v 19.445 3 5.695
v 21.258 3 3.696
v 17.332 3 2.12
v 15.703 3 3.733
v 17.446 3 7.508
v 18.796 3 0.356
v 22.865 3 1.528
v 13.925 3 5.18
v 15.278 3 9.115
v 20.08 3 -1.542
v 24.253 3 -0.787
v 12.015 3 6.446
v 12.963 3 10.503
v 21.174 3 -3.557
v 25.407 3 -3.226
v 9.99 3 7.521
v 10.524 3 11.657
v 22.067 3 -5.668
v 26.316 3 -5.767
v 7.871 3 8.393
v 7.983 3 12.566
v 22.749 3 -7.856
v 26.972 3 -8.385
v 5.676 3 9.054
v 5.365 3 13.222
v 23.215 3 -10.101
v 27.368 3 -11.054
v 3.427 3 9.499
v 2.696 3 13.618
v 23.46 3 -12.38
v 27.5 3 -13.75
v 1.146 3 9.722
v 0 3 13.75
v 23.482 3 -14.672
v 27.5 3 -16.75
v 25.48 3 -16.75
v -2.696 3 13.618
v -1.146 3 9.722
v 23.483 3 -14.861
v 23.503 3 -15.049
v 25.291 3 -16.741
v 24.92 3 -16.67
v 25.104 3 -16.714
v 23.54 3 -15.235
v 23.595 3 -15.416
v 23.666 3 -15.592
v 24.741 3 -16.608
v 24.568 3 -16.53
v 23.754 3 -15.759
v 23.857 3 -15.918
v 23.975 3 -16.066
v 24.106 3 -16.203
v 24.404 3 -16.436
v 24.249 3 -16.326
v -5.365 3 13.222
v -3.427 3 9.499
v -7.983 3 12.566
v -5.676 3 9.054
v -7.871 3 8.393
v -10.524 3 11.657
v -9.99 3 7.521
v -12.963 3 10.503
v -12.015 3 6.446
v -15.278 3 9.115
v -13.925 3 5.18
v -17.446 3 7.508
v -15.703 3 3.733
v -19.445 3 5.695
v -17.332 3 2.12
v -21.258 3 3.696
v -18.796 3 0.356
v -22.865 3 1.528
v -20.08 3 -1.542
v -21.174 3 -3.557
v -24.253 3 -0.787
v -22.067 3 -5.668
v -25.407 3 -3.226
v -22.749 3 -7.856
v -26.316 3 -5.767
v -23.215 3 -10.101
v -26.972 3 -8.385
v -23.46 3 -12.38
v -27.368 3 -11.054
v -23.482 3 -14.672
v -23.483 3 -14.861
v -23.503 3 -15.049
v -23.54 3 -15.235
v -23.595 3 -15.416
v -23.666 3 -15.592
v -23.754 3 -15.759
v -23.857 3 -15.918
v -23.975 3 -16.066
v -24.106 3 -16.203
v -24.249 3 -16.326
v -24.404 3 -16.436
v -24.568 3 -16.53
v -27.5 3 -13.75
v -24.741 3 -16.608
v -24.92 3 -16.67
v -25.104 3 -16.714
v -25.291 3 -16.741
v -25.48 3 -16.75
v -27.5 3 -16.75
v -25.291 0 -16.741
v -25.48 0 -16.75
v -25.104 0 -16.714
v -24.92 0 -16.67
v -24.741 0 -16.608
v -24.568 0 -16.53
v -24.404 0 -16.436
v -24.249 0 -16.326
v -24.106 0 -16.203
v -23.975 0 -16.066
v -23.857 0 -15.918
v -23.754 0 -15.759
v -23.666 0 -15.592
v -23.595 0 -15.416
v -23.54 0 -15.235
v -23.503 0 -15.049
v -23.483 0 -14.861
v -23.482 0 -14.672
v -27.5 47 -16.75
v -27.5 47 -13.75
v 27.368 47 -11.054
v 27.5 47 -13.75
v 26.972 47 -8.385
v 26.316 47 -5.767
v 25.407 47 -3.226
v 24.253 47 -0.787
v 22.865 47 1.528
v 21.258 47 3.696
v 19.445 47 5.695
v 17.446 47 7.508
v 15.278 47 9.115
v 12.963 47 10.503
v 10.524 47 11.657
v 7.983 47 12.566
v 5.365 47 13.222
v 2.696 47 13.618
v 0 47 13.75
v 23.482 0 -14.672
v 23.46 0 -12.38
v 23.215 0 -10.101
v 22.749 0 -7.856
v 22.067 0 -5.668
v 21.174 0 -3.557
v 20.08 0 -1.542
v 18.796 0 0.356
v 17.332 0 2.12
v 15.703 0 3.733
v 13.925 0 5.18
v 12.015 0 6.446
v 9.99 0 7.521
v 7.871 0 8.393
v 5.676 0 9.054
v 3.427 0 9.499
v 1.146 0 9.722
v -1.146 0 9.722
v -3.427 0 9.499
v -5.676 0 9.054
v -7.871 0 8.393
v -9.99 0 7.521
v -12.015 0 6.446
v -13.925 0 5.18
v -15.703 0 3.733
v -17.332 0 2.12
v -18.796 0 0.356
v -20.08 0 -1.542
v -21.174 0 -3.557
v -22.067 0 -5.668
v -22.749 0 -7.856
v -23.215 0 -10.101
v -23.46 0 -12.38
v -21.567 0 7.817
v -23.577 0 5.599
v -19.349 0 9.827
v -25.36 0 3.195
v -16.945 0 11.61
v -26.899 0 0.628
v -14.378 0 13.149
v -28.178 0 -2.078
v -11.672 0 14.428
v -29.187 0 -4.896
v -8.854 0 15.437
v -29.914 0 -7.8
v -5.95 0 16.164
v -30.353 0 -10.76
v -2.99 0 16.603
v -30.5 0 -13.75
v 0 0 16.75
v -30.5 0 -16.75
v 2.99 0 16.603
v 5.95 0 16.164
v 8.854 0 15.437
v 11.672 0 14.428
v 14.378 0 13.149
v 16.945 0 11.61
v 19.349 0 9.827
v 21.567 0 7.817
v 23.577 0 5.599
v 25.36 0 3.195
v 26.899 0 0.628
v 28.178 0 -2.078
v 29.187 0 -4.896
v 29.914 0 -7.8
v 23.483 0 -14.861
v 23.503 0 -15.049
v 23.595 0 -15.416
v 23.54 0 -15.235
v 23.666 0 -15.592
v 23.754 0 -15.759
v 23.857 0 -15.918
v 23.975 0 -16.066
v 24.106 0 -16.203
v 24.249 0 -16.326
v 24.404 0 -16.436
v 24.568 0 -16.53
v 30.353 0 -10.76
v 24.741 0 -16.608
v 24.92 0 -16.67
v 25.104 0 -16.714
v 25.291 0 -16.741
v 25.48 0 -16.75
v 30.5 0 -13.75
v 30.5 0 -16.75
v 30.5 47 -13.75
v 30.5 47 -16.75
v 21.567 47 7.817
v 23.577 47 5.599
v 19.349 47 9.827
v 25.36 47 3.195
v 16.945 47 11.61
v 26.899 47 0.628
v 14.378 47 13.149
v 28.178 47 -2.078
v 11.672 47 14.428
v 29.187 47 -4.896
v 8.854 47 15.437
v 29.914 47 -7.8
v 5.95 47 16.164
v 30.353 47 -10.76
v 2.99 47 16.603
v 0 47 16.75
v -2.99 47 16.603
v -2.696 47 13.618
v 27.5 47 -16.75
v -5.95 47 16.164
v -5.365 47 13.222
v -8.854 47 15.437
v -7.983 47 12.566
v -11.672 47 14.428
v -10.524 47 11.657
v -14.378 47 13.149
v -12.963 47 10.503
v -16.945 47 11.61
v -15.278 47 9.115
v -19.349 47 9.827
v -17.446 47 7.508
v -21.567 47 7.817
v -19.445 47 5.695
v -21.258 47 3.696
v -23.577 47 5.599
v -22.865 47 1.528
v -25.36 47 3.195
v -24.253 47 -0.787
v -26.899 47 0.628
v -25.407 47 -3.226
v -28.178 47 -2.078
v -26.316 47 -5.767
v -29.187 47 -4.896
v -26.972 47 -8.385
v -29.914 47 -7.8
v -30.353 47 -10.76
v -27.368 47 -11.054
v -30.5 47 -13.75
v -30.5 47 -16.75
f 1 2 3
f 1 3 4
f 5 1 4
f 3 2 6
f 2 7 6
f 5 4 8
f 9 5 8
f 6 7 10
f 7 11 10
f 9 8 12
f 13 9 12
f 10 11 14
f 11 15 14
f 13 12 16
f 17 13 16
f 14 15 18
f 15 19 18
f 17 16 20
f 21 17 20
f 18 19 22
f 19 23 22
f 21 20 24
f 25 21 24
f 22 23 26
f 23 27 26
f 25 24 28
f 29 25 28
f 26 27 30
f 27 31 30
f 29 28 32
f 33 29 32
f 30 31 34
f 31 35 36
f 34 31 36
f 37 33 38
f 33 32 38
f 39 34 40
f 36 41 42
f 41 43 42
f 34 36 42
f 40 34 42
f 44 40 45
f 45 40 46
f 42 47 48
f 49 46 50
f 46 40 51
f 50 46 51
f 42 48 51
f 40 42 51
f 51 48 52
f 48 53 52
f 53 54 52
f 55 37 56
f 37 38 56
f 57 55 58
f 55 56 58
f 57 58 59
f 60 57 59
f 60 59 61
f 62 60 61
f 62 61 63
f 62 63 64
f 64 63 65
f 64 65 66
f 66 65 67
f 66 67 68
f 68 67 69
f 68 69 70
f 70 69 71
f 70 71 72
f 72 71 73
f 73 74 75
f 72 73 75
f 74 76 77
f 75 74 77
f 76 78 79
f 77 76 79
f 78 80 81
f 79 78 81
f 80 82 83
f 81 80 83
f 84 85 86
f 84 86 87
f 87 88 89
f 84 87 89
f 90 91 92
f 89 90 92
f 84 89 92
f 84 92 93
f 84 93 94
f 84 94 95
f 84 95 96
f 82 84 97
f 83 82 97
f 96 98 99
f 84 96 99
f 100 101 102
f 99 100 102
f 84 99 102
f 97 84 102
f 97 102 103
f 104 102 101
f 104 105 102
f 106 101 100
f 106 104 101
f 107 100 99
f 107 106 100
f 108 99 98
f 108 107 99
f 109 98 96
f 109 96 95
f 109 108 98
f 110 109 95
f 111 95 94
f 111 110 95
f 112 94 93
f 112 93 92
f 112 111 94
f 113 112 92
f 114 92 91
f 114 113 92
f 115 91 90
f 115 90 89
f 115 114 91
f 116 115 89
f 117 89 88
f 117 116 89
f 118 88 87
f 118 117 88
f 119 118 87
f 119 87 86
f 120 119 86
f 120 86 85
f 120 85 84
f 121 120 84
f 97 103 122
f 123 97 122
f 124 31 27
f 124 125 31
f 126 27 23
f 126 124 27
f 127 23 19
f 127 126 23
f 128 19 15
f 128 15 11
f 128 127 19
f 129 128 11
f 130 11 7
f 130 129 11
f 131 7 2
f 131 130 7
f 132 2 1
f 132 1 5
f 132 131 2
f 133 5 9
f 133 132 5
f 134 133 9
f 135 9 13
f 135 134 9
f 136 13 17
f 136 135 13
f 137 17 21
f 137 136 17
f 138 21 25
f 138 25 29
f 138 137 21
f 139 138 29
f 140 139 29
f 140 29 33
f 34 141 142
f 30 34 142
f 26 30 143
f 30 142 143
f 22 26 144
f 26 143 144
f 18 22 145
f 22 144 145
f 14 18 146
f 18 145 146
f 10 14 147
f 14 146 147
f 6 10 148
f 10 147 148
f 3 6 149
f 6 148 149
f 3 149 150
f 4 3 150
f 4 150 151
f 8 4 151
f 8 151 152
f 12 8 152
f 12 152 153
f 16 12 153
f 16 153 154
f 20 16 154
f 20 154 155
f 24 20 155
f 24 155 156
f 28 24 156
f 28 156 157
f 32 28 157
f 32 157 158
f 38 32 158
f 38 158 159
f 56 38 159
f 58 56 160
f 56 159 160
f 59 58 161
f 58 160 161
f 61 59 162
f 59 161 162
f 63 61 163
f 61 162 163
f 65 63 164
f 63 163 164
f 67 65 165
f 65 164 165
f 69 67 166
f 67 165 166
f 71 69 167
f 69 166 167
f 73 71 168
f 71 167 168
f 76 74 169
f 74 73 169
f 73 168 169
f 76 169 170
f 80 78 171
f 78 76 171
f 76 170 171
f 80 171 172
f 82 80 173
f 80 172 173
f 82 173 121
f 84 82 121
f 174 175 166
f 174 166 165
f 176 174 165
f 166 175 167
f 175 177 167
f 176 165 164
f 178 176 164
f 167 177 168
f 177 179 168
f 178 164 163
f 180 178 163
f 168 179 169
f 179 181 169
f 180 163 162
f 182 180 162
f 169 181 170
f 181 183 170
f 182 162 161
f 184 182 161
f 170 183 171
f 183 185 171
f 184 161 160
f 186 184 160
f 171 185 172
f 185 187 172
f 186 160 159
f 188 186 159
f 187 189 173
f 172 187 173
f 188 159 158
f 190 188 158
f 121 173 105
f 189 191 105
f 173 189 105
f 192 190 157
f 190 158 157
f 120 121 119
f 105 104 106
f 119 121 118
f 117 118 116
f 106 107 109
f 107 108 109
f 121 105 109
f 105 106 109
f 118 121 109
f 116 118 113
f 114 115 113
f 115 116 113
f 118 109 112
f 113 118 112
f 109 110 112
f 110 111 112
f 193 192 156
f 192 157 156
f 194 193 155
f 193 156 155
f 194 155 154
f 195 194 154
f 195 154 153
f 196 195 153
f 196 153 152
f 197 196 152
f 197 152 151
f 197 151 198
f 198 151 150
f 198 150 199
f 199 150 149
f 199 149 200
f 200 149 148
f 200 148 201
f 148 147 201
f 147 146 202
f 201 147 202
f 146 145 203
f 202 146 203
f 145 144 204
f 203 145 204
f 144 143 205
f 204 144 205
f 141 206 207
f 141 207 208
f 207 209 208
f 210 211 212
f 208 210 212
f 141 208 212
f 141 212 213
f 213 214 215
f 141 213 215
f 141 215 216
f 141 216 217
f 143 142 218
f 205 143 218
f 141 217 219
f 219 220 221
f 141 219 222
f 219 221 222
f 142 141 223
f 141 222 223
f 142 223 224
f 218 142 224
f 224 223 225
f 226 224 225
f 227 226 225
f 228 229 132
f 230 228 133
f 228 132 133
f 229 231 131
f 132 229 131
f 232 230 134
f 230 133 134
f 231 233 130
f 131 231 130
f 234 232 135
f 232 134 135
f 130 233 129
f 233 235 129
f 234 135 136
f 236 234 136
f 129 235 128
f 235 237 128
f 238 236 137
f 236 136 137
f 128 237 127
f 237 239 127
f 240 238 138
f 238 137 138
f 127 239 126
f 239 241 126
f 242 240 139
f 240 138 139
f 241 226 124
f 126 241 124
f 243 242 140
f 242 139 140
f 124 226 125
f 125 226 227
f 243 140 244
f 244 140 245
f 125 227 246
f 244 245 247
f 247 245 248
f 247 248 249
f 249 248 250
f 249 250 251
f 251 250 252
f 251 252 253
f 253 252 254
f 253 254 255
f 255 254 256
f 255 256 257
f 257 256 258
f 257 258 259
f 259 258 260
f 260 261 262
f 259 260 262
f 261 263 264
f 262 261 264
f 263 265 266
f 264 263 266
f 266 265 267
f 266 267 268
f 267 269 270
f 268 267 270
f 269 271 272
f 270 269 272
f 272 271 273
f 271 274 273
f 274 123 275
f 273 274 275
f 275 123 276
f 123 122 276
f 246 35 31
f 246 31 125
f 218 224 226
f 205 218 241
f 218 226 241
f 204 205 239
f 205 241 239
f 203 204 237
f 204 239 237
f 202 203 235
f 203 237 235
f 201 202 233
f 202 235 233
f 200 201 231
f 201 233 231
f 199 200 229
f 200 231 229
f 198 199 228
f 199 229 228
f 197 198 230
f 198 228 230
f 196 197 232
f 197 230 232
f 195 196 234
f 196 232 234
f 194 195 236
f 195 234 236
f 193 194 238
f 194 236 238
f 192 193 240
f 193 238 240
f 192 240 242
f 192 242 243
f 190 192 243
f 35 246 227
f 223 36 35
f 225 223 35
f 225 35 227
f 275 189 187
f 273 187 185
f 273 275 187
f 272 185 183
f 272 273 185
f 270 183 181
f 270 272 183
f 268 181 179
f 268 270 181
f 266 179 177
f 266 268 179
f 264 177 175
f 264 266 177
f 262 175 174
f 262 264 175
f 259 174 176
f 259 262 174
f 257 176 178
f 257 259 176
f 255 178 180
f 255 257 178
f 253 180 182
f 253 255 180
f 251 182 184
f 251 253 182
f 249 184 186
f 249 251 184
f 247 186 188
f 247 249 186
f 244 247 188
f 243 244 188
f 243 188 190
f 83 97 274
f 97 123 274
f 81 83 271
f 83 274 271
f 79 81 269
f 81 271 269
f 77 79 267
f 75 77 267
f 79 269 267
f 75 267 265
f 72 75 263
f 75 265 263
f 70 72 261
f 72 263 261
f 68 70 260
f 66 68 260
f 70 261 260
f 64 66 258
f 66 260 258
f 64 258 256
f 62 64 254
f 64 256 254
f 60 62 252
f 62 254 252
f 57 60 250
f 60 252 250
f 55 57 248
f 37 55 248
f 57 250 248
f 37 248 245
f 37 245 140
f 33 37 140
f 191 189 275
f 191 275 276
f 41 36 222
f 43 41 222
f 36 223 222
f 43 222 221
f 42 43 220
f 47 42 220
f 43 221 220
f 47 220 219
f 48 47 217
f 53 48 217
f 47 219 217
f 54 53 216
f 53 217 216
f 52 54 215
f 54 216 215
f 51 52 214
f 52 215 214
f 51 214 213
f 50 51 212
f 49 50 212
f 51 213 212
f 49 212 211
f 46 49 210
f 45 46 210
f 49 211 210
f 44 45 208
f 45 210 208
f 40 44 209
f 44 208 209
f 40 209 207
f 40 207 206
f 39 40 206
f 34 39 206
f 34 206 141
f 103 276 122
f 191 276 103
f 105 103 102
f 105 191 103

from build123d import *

# Parameters (mm, degrees)
SKETCH_1_W          = 61
SKETCH_1_H          = 33.5
EXTRUDE_1_DEPTH     = 50
SKETCH_2_W          = 55
SKETCH_2_H          = 44
CUT_EXTRUDE_1_DEPTH = 30.5
FILLET_3_R          = 27.5
FILLET_4_R          = 30.5
SKETCH_3_R          = 23.5
CUT_EXTRUDE_2_DEPTH = 30.5
SKETCH_5_R          = 16
CUT_EXTRUDE_4_DEPTH = 30.5
FILLET_5_R          = 4
FILLET_6_R          = 2
SKETCH_6_W          = 61
SKETCH_6_H          = 3
CUT_EXTRUDE_5_DEPTH = 400


with BuildPart() as part:
    # 스케치1 → 보스-돌출1 (new body)
    with BuildSketch(Plane(origin=(0, 0, 0), x_dir=(1, 0, 0), z_dir=(0, 1, 0))):
        Rectangle(SKETCH_1_W, SKETCH_1_H)
    extrude(amount=EXTRUDE_1_DEPTH)

    # 스케치2 → 컷-돌출1 (cut)
    with BuildSketch(Plane(origin=(0, 0, -16.75), x_dir=(-1, 0, 0), z_dir=(0, 0, -1))):
        with Locations((0, 25)):
            Rectangle(SKETCH_2_W, SKETCH_2_H)
    extrude(amount=-CUT_EXTRUDE_1_DEPTH, mode=Mode.SUBTRACT)

    # 필렛3
    fillet_3_edges = [part.edges().sort_by_distance(p)[0] for p in [
        (-27.5, 25, 13.75),
        (27.5, 25, 13.75),
    ]]
    fillet(fillet_3_edges, radius=FILLET_3_R - 0.0001)  # a hair under: the kernel refuses the full size

    # 필렛4
    fillet_4_edges = [part.edges().sort_by_distance(p)[0] for p in [
        (-30.5, 25, 16.75),
        (30.5, 25, 16.75),
    ]]
    fillet(fillet_4_edges, radius=FILLET_4_R - 0.0001)  # a hair under: the kernel refuses the full size

    # 스케치3 → 컷-돌출2 (cut)
    with BuildSketch(Plane.XZ):
        with Locations((0, -13.75)):
            Circle(SKETCH_3_R)
    extrude(amount=-CUT_EXTRUDE_2_DEPTH, mode=Mode.SUBTRACT)

    # 스케치5 → 컷-돌출4 (cut)
    with BuildSketch(Plane.XZ.offset(-47)):
        with Locations((0, -13.75)):
            Circle(SKETCH_5_R)
    extrude(amount=-CUT_EXTRUDE_4_DEPTH, mode=Mode.SUBTRACT)

    # 필렛5
    fillet_5_edges = [part.edges().sort_by_distance(p)[0] for p in [
        (-15.716233646, 48.5, -16.75),
        (15.716233646, 48.5, -16.75),
    ]]
    fillet(fillet_5_edges, radius=FILLET_5_R)

    # 필렛6
    fillet_6_edges = [part.edges().sort_by_distance(p)[0] for p in [
        (-23.307724042, 1.5, -16.75),
        (23.307724042, 1.5, -16.75),
    ]]
    fillet(fillet_6_edges, radius=FILLET_6_R)

    # 스케치6 → 컷-돌출5 (cut)
    with BuildSketch(Plane(origin=(0, 0, -16.75), x_dir=(-1, 0, 0), z_dir=(0, 0, -1))):
        with Locations((0, 48.5)):
            Rectangle(SKETCH_6_W, SKETCH_6_H)
    extrude(amount=-CUT_EXTRUDE_5_DEPTH, mode=Mode.SUBTRACT)


solid = part.part
